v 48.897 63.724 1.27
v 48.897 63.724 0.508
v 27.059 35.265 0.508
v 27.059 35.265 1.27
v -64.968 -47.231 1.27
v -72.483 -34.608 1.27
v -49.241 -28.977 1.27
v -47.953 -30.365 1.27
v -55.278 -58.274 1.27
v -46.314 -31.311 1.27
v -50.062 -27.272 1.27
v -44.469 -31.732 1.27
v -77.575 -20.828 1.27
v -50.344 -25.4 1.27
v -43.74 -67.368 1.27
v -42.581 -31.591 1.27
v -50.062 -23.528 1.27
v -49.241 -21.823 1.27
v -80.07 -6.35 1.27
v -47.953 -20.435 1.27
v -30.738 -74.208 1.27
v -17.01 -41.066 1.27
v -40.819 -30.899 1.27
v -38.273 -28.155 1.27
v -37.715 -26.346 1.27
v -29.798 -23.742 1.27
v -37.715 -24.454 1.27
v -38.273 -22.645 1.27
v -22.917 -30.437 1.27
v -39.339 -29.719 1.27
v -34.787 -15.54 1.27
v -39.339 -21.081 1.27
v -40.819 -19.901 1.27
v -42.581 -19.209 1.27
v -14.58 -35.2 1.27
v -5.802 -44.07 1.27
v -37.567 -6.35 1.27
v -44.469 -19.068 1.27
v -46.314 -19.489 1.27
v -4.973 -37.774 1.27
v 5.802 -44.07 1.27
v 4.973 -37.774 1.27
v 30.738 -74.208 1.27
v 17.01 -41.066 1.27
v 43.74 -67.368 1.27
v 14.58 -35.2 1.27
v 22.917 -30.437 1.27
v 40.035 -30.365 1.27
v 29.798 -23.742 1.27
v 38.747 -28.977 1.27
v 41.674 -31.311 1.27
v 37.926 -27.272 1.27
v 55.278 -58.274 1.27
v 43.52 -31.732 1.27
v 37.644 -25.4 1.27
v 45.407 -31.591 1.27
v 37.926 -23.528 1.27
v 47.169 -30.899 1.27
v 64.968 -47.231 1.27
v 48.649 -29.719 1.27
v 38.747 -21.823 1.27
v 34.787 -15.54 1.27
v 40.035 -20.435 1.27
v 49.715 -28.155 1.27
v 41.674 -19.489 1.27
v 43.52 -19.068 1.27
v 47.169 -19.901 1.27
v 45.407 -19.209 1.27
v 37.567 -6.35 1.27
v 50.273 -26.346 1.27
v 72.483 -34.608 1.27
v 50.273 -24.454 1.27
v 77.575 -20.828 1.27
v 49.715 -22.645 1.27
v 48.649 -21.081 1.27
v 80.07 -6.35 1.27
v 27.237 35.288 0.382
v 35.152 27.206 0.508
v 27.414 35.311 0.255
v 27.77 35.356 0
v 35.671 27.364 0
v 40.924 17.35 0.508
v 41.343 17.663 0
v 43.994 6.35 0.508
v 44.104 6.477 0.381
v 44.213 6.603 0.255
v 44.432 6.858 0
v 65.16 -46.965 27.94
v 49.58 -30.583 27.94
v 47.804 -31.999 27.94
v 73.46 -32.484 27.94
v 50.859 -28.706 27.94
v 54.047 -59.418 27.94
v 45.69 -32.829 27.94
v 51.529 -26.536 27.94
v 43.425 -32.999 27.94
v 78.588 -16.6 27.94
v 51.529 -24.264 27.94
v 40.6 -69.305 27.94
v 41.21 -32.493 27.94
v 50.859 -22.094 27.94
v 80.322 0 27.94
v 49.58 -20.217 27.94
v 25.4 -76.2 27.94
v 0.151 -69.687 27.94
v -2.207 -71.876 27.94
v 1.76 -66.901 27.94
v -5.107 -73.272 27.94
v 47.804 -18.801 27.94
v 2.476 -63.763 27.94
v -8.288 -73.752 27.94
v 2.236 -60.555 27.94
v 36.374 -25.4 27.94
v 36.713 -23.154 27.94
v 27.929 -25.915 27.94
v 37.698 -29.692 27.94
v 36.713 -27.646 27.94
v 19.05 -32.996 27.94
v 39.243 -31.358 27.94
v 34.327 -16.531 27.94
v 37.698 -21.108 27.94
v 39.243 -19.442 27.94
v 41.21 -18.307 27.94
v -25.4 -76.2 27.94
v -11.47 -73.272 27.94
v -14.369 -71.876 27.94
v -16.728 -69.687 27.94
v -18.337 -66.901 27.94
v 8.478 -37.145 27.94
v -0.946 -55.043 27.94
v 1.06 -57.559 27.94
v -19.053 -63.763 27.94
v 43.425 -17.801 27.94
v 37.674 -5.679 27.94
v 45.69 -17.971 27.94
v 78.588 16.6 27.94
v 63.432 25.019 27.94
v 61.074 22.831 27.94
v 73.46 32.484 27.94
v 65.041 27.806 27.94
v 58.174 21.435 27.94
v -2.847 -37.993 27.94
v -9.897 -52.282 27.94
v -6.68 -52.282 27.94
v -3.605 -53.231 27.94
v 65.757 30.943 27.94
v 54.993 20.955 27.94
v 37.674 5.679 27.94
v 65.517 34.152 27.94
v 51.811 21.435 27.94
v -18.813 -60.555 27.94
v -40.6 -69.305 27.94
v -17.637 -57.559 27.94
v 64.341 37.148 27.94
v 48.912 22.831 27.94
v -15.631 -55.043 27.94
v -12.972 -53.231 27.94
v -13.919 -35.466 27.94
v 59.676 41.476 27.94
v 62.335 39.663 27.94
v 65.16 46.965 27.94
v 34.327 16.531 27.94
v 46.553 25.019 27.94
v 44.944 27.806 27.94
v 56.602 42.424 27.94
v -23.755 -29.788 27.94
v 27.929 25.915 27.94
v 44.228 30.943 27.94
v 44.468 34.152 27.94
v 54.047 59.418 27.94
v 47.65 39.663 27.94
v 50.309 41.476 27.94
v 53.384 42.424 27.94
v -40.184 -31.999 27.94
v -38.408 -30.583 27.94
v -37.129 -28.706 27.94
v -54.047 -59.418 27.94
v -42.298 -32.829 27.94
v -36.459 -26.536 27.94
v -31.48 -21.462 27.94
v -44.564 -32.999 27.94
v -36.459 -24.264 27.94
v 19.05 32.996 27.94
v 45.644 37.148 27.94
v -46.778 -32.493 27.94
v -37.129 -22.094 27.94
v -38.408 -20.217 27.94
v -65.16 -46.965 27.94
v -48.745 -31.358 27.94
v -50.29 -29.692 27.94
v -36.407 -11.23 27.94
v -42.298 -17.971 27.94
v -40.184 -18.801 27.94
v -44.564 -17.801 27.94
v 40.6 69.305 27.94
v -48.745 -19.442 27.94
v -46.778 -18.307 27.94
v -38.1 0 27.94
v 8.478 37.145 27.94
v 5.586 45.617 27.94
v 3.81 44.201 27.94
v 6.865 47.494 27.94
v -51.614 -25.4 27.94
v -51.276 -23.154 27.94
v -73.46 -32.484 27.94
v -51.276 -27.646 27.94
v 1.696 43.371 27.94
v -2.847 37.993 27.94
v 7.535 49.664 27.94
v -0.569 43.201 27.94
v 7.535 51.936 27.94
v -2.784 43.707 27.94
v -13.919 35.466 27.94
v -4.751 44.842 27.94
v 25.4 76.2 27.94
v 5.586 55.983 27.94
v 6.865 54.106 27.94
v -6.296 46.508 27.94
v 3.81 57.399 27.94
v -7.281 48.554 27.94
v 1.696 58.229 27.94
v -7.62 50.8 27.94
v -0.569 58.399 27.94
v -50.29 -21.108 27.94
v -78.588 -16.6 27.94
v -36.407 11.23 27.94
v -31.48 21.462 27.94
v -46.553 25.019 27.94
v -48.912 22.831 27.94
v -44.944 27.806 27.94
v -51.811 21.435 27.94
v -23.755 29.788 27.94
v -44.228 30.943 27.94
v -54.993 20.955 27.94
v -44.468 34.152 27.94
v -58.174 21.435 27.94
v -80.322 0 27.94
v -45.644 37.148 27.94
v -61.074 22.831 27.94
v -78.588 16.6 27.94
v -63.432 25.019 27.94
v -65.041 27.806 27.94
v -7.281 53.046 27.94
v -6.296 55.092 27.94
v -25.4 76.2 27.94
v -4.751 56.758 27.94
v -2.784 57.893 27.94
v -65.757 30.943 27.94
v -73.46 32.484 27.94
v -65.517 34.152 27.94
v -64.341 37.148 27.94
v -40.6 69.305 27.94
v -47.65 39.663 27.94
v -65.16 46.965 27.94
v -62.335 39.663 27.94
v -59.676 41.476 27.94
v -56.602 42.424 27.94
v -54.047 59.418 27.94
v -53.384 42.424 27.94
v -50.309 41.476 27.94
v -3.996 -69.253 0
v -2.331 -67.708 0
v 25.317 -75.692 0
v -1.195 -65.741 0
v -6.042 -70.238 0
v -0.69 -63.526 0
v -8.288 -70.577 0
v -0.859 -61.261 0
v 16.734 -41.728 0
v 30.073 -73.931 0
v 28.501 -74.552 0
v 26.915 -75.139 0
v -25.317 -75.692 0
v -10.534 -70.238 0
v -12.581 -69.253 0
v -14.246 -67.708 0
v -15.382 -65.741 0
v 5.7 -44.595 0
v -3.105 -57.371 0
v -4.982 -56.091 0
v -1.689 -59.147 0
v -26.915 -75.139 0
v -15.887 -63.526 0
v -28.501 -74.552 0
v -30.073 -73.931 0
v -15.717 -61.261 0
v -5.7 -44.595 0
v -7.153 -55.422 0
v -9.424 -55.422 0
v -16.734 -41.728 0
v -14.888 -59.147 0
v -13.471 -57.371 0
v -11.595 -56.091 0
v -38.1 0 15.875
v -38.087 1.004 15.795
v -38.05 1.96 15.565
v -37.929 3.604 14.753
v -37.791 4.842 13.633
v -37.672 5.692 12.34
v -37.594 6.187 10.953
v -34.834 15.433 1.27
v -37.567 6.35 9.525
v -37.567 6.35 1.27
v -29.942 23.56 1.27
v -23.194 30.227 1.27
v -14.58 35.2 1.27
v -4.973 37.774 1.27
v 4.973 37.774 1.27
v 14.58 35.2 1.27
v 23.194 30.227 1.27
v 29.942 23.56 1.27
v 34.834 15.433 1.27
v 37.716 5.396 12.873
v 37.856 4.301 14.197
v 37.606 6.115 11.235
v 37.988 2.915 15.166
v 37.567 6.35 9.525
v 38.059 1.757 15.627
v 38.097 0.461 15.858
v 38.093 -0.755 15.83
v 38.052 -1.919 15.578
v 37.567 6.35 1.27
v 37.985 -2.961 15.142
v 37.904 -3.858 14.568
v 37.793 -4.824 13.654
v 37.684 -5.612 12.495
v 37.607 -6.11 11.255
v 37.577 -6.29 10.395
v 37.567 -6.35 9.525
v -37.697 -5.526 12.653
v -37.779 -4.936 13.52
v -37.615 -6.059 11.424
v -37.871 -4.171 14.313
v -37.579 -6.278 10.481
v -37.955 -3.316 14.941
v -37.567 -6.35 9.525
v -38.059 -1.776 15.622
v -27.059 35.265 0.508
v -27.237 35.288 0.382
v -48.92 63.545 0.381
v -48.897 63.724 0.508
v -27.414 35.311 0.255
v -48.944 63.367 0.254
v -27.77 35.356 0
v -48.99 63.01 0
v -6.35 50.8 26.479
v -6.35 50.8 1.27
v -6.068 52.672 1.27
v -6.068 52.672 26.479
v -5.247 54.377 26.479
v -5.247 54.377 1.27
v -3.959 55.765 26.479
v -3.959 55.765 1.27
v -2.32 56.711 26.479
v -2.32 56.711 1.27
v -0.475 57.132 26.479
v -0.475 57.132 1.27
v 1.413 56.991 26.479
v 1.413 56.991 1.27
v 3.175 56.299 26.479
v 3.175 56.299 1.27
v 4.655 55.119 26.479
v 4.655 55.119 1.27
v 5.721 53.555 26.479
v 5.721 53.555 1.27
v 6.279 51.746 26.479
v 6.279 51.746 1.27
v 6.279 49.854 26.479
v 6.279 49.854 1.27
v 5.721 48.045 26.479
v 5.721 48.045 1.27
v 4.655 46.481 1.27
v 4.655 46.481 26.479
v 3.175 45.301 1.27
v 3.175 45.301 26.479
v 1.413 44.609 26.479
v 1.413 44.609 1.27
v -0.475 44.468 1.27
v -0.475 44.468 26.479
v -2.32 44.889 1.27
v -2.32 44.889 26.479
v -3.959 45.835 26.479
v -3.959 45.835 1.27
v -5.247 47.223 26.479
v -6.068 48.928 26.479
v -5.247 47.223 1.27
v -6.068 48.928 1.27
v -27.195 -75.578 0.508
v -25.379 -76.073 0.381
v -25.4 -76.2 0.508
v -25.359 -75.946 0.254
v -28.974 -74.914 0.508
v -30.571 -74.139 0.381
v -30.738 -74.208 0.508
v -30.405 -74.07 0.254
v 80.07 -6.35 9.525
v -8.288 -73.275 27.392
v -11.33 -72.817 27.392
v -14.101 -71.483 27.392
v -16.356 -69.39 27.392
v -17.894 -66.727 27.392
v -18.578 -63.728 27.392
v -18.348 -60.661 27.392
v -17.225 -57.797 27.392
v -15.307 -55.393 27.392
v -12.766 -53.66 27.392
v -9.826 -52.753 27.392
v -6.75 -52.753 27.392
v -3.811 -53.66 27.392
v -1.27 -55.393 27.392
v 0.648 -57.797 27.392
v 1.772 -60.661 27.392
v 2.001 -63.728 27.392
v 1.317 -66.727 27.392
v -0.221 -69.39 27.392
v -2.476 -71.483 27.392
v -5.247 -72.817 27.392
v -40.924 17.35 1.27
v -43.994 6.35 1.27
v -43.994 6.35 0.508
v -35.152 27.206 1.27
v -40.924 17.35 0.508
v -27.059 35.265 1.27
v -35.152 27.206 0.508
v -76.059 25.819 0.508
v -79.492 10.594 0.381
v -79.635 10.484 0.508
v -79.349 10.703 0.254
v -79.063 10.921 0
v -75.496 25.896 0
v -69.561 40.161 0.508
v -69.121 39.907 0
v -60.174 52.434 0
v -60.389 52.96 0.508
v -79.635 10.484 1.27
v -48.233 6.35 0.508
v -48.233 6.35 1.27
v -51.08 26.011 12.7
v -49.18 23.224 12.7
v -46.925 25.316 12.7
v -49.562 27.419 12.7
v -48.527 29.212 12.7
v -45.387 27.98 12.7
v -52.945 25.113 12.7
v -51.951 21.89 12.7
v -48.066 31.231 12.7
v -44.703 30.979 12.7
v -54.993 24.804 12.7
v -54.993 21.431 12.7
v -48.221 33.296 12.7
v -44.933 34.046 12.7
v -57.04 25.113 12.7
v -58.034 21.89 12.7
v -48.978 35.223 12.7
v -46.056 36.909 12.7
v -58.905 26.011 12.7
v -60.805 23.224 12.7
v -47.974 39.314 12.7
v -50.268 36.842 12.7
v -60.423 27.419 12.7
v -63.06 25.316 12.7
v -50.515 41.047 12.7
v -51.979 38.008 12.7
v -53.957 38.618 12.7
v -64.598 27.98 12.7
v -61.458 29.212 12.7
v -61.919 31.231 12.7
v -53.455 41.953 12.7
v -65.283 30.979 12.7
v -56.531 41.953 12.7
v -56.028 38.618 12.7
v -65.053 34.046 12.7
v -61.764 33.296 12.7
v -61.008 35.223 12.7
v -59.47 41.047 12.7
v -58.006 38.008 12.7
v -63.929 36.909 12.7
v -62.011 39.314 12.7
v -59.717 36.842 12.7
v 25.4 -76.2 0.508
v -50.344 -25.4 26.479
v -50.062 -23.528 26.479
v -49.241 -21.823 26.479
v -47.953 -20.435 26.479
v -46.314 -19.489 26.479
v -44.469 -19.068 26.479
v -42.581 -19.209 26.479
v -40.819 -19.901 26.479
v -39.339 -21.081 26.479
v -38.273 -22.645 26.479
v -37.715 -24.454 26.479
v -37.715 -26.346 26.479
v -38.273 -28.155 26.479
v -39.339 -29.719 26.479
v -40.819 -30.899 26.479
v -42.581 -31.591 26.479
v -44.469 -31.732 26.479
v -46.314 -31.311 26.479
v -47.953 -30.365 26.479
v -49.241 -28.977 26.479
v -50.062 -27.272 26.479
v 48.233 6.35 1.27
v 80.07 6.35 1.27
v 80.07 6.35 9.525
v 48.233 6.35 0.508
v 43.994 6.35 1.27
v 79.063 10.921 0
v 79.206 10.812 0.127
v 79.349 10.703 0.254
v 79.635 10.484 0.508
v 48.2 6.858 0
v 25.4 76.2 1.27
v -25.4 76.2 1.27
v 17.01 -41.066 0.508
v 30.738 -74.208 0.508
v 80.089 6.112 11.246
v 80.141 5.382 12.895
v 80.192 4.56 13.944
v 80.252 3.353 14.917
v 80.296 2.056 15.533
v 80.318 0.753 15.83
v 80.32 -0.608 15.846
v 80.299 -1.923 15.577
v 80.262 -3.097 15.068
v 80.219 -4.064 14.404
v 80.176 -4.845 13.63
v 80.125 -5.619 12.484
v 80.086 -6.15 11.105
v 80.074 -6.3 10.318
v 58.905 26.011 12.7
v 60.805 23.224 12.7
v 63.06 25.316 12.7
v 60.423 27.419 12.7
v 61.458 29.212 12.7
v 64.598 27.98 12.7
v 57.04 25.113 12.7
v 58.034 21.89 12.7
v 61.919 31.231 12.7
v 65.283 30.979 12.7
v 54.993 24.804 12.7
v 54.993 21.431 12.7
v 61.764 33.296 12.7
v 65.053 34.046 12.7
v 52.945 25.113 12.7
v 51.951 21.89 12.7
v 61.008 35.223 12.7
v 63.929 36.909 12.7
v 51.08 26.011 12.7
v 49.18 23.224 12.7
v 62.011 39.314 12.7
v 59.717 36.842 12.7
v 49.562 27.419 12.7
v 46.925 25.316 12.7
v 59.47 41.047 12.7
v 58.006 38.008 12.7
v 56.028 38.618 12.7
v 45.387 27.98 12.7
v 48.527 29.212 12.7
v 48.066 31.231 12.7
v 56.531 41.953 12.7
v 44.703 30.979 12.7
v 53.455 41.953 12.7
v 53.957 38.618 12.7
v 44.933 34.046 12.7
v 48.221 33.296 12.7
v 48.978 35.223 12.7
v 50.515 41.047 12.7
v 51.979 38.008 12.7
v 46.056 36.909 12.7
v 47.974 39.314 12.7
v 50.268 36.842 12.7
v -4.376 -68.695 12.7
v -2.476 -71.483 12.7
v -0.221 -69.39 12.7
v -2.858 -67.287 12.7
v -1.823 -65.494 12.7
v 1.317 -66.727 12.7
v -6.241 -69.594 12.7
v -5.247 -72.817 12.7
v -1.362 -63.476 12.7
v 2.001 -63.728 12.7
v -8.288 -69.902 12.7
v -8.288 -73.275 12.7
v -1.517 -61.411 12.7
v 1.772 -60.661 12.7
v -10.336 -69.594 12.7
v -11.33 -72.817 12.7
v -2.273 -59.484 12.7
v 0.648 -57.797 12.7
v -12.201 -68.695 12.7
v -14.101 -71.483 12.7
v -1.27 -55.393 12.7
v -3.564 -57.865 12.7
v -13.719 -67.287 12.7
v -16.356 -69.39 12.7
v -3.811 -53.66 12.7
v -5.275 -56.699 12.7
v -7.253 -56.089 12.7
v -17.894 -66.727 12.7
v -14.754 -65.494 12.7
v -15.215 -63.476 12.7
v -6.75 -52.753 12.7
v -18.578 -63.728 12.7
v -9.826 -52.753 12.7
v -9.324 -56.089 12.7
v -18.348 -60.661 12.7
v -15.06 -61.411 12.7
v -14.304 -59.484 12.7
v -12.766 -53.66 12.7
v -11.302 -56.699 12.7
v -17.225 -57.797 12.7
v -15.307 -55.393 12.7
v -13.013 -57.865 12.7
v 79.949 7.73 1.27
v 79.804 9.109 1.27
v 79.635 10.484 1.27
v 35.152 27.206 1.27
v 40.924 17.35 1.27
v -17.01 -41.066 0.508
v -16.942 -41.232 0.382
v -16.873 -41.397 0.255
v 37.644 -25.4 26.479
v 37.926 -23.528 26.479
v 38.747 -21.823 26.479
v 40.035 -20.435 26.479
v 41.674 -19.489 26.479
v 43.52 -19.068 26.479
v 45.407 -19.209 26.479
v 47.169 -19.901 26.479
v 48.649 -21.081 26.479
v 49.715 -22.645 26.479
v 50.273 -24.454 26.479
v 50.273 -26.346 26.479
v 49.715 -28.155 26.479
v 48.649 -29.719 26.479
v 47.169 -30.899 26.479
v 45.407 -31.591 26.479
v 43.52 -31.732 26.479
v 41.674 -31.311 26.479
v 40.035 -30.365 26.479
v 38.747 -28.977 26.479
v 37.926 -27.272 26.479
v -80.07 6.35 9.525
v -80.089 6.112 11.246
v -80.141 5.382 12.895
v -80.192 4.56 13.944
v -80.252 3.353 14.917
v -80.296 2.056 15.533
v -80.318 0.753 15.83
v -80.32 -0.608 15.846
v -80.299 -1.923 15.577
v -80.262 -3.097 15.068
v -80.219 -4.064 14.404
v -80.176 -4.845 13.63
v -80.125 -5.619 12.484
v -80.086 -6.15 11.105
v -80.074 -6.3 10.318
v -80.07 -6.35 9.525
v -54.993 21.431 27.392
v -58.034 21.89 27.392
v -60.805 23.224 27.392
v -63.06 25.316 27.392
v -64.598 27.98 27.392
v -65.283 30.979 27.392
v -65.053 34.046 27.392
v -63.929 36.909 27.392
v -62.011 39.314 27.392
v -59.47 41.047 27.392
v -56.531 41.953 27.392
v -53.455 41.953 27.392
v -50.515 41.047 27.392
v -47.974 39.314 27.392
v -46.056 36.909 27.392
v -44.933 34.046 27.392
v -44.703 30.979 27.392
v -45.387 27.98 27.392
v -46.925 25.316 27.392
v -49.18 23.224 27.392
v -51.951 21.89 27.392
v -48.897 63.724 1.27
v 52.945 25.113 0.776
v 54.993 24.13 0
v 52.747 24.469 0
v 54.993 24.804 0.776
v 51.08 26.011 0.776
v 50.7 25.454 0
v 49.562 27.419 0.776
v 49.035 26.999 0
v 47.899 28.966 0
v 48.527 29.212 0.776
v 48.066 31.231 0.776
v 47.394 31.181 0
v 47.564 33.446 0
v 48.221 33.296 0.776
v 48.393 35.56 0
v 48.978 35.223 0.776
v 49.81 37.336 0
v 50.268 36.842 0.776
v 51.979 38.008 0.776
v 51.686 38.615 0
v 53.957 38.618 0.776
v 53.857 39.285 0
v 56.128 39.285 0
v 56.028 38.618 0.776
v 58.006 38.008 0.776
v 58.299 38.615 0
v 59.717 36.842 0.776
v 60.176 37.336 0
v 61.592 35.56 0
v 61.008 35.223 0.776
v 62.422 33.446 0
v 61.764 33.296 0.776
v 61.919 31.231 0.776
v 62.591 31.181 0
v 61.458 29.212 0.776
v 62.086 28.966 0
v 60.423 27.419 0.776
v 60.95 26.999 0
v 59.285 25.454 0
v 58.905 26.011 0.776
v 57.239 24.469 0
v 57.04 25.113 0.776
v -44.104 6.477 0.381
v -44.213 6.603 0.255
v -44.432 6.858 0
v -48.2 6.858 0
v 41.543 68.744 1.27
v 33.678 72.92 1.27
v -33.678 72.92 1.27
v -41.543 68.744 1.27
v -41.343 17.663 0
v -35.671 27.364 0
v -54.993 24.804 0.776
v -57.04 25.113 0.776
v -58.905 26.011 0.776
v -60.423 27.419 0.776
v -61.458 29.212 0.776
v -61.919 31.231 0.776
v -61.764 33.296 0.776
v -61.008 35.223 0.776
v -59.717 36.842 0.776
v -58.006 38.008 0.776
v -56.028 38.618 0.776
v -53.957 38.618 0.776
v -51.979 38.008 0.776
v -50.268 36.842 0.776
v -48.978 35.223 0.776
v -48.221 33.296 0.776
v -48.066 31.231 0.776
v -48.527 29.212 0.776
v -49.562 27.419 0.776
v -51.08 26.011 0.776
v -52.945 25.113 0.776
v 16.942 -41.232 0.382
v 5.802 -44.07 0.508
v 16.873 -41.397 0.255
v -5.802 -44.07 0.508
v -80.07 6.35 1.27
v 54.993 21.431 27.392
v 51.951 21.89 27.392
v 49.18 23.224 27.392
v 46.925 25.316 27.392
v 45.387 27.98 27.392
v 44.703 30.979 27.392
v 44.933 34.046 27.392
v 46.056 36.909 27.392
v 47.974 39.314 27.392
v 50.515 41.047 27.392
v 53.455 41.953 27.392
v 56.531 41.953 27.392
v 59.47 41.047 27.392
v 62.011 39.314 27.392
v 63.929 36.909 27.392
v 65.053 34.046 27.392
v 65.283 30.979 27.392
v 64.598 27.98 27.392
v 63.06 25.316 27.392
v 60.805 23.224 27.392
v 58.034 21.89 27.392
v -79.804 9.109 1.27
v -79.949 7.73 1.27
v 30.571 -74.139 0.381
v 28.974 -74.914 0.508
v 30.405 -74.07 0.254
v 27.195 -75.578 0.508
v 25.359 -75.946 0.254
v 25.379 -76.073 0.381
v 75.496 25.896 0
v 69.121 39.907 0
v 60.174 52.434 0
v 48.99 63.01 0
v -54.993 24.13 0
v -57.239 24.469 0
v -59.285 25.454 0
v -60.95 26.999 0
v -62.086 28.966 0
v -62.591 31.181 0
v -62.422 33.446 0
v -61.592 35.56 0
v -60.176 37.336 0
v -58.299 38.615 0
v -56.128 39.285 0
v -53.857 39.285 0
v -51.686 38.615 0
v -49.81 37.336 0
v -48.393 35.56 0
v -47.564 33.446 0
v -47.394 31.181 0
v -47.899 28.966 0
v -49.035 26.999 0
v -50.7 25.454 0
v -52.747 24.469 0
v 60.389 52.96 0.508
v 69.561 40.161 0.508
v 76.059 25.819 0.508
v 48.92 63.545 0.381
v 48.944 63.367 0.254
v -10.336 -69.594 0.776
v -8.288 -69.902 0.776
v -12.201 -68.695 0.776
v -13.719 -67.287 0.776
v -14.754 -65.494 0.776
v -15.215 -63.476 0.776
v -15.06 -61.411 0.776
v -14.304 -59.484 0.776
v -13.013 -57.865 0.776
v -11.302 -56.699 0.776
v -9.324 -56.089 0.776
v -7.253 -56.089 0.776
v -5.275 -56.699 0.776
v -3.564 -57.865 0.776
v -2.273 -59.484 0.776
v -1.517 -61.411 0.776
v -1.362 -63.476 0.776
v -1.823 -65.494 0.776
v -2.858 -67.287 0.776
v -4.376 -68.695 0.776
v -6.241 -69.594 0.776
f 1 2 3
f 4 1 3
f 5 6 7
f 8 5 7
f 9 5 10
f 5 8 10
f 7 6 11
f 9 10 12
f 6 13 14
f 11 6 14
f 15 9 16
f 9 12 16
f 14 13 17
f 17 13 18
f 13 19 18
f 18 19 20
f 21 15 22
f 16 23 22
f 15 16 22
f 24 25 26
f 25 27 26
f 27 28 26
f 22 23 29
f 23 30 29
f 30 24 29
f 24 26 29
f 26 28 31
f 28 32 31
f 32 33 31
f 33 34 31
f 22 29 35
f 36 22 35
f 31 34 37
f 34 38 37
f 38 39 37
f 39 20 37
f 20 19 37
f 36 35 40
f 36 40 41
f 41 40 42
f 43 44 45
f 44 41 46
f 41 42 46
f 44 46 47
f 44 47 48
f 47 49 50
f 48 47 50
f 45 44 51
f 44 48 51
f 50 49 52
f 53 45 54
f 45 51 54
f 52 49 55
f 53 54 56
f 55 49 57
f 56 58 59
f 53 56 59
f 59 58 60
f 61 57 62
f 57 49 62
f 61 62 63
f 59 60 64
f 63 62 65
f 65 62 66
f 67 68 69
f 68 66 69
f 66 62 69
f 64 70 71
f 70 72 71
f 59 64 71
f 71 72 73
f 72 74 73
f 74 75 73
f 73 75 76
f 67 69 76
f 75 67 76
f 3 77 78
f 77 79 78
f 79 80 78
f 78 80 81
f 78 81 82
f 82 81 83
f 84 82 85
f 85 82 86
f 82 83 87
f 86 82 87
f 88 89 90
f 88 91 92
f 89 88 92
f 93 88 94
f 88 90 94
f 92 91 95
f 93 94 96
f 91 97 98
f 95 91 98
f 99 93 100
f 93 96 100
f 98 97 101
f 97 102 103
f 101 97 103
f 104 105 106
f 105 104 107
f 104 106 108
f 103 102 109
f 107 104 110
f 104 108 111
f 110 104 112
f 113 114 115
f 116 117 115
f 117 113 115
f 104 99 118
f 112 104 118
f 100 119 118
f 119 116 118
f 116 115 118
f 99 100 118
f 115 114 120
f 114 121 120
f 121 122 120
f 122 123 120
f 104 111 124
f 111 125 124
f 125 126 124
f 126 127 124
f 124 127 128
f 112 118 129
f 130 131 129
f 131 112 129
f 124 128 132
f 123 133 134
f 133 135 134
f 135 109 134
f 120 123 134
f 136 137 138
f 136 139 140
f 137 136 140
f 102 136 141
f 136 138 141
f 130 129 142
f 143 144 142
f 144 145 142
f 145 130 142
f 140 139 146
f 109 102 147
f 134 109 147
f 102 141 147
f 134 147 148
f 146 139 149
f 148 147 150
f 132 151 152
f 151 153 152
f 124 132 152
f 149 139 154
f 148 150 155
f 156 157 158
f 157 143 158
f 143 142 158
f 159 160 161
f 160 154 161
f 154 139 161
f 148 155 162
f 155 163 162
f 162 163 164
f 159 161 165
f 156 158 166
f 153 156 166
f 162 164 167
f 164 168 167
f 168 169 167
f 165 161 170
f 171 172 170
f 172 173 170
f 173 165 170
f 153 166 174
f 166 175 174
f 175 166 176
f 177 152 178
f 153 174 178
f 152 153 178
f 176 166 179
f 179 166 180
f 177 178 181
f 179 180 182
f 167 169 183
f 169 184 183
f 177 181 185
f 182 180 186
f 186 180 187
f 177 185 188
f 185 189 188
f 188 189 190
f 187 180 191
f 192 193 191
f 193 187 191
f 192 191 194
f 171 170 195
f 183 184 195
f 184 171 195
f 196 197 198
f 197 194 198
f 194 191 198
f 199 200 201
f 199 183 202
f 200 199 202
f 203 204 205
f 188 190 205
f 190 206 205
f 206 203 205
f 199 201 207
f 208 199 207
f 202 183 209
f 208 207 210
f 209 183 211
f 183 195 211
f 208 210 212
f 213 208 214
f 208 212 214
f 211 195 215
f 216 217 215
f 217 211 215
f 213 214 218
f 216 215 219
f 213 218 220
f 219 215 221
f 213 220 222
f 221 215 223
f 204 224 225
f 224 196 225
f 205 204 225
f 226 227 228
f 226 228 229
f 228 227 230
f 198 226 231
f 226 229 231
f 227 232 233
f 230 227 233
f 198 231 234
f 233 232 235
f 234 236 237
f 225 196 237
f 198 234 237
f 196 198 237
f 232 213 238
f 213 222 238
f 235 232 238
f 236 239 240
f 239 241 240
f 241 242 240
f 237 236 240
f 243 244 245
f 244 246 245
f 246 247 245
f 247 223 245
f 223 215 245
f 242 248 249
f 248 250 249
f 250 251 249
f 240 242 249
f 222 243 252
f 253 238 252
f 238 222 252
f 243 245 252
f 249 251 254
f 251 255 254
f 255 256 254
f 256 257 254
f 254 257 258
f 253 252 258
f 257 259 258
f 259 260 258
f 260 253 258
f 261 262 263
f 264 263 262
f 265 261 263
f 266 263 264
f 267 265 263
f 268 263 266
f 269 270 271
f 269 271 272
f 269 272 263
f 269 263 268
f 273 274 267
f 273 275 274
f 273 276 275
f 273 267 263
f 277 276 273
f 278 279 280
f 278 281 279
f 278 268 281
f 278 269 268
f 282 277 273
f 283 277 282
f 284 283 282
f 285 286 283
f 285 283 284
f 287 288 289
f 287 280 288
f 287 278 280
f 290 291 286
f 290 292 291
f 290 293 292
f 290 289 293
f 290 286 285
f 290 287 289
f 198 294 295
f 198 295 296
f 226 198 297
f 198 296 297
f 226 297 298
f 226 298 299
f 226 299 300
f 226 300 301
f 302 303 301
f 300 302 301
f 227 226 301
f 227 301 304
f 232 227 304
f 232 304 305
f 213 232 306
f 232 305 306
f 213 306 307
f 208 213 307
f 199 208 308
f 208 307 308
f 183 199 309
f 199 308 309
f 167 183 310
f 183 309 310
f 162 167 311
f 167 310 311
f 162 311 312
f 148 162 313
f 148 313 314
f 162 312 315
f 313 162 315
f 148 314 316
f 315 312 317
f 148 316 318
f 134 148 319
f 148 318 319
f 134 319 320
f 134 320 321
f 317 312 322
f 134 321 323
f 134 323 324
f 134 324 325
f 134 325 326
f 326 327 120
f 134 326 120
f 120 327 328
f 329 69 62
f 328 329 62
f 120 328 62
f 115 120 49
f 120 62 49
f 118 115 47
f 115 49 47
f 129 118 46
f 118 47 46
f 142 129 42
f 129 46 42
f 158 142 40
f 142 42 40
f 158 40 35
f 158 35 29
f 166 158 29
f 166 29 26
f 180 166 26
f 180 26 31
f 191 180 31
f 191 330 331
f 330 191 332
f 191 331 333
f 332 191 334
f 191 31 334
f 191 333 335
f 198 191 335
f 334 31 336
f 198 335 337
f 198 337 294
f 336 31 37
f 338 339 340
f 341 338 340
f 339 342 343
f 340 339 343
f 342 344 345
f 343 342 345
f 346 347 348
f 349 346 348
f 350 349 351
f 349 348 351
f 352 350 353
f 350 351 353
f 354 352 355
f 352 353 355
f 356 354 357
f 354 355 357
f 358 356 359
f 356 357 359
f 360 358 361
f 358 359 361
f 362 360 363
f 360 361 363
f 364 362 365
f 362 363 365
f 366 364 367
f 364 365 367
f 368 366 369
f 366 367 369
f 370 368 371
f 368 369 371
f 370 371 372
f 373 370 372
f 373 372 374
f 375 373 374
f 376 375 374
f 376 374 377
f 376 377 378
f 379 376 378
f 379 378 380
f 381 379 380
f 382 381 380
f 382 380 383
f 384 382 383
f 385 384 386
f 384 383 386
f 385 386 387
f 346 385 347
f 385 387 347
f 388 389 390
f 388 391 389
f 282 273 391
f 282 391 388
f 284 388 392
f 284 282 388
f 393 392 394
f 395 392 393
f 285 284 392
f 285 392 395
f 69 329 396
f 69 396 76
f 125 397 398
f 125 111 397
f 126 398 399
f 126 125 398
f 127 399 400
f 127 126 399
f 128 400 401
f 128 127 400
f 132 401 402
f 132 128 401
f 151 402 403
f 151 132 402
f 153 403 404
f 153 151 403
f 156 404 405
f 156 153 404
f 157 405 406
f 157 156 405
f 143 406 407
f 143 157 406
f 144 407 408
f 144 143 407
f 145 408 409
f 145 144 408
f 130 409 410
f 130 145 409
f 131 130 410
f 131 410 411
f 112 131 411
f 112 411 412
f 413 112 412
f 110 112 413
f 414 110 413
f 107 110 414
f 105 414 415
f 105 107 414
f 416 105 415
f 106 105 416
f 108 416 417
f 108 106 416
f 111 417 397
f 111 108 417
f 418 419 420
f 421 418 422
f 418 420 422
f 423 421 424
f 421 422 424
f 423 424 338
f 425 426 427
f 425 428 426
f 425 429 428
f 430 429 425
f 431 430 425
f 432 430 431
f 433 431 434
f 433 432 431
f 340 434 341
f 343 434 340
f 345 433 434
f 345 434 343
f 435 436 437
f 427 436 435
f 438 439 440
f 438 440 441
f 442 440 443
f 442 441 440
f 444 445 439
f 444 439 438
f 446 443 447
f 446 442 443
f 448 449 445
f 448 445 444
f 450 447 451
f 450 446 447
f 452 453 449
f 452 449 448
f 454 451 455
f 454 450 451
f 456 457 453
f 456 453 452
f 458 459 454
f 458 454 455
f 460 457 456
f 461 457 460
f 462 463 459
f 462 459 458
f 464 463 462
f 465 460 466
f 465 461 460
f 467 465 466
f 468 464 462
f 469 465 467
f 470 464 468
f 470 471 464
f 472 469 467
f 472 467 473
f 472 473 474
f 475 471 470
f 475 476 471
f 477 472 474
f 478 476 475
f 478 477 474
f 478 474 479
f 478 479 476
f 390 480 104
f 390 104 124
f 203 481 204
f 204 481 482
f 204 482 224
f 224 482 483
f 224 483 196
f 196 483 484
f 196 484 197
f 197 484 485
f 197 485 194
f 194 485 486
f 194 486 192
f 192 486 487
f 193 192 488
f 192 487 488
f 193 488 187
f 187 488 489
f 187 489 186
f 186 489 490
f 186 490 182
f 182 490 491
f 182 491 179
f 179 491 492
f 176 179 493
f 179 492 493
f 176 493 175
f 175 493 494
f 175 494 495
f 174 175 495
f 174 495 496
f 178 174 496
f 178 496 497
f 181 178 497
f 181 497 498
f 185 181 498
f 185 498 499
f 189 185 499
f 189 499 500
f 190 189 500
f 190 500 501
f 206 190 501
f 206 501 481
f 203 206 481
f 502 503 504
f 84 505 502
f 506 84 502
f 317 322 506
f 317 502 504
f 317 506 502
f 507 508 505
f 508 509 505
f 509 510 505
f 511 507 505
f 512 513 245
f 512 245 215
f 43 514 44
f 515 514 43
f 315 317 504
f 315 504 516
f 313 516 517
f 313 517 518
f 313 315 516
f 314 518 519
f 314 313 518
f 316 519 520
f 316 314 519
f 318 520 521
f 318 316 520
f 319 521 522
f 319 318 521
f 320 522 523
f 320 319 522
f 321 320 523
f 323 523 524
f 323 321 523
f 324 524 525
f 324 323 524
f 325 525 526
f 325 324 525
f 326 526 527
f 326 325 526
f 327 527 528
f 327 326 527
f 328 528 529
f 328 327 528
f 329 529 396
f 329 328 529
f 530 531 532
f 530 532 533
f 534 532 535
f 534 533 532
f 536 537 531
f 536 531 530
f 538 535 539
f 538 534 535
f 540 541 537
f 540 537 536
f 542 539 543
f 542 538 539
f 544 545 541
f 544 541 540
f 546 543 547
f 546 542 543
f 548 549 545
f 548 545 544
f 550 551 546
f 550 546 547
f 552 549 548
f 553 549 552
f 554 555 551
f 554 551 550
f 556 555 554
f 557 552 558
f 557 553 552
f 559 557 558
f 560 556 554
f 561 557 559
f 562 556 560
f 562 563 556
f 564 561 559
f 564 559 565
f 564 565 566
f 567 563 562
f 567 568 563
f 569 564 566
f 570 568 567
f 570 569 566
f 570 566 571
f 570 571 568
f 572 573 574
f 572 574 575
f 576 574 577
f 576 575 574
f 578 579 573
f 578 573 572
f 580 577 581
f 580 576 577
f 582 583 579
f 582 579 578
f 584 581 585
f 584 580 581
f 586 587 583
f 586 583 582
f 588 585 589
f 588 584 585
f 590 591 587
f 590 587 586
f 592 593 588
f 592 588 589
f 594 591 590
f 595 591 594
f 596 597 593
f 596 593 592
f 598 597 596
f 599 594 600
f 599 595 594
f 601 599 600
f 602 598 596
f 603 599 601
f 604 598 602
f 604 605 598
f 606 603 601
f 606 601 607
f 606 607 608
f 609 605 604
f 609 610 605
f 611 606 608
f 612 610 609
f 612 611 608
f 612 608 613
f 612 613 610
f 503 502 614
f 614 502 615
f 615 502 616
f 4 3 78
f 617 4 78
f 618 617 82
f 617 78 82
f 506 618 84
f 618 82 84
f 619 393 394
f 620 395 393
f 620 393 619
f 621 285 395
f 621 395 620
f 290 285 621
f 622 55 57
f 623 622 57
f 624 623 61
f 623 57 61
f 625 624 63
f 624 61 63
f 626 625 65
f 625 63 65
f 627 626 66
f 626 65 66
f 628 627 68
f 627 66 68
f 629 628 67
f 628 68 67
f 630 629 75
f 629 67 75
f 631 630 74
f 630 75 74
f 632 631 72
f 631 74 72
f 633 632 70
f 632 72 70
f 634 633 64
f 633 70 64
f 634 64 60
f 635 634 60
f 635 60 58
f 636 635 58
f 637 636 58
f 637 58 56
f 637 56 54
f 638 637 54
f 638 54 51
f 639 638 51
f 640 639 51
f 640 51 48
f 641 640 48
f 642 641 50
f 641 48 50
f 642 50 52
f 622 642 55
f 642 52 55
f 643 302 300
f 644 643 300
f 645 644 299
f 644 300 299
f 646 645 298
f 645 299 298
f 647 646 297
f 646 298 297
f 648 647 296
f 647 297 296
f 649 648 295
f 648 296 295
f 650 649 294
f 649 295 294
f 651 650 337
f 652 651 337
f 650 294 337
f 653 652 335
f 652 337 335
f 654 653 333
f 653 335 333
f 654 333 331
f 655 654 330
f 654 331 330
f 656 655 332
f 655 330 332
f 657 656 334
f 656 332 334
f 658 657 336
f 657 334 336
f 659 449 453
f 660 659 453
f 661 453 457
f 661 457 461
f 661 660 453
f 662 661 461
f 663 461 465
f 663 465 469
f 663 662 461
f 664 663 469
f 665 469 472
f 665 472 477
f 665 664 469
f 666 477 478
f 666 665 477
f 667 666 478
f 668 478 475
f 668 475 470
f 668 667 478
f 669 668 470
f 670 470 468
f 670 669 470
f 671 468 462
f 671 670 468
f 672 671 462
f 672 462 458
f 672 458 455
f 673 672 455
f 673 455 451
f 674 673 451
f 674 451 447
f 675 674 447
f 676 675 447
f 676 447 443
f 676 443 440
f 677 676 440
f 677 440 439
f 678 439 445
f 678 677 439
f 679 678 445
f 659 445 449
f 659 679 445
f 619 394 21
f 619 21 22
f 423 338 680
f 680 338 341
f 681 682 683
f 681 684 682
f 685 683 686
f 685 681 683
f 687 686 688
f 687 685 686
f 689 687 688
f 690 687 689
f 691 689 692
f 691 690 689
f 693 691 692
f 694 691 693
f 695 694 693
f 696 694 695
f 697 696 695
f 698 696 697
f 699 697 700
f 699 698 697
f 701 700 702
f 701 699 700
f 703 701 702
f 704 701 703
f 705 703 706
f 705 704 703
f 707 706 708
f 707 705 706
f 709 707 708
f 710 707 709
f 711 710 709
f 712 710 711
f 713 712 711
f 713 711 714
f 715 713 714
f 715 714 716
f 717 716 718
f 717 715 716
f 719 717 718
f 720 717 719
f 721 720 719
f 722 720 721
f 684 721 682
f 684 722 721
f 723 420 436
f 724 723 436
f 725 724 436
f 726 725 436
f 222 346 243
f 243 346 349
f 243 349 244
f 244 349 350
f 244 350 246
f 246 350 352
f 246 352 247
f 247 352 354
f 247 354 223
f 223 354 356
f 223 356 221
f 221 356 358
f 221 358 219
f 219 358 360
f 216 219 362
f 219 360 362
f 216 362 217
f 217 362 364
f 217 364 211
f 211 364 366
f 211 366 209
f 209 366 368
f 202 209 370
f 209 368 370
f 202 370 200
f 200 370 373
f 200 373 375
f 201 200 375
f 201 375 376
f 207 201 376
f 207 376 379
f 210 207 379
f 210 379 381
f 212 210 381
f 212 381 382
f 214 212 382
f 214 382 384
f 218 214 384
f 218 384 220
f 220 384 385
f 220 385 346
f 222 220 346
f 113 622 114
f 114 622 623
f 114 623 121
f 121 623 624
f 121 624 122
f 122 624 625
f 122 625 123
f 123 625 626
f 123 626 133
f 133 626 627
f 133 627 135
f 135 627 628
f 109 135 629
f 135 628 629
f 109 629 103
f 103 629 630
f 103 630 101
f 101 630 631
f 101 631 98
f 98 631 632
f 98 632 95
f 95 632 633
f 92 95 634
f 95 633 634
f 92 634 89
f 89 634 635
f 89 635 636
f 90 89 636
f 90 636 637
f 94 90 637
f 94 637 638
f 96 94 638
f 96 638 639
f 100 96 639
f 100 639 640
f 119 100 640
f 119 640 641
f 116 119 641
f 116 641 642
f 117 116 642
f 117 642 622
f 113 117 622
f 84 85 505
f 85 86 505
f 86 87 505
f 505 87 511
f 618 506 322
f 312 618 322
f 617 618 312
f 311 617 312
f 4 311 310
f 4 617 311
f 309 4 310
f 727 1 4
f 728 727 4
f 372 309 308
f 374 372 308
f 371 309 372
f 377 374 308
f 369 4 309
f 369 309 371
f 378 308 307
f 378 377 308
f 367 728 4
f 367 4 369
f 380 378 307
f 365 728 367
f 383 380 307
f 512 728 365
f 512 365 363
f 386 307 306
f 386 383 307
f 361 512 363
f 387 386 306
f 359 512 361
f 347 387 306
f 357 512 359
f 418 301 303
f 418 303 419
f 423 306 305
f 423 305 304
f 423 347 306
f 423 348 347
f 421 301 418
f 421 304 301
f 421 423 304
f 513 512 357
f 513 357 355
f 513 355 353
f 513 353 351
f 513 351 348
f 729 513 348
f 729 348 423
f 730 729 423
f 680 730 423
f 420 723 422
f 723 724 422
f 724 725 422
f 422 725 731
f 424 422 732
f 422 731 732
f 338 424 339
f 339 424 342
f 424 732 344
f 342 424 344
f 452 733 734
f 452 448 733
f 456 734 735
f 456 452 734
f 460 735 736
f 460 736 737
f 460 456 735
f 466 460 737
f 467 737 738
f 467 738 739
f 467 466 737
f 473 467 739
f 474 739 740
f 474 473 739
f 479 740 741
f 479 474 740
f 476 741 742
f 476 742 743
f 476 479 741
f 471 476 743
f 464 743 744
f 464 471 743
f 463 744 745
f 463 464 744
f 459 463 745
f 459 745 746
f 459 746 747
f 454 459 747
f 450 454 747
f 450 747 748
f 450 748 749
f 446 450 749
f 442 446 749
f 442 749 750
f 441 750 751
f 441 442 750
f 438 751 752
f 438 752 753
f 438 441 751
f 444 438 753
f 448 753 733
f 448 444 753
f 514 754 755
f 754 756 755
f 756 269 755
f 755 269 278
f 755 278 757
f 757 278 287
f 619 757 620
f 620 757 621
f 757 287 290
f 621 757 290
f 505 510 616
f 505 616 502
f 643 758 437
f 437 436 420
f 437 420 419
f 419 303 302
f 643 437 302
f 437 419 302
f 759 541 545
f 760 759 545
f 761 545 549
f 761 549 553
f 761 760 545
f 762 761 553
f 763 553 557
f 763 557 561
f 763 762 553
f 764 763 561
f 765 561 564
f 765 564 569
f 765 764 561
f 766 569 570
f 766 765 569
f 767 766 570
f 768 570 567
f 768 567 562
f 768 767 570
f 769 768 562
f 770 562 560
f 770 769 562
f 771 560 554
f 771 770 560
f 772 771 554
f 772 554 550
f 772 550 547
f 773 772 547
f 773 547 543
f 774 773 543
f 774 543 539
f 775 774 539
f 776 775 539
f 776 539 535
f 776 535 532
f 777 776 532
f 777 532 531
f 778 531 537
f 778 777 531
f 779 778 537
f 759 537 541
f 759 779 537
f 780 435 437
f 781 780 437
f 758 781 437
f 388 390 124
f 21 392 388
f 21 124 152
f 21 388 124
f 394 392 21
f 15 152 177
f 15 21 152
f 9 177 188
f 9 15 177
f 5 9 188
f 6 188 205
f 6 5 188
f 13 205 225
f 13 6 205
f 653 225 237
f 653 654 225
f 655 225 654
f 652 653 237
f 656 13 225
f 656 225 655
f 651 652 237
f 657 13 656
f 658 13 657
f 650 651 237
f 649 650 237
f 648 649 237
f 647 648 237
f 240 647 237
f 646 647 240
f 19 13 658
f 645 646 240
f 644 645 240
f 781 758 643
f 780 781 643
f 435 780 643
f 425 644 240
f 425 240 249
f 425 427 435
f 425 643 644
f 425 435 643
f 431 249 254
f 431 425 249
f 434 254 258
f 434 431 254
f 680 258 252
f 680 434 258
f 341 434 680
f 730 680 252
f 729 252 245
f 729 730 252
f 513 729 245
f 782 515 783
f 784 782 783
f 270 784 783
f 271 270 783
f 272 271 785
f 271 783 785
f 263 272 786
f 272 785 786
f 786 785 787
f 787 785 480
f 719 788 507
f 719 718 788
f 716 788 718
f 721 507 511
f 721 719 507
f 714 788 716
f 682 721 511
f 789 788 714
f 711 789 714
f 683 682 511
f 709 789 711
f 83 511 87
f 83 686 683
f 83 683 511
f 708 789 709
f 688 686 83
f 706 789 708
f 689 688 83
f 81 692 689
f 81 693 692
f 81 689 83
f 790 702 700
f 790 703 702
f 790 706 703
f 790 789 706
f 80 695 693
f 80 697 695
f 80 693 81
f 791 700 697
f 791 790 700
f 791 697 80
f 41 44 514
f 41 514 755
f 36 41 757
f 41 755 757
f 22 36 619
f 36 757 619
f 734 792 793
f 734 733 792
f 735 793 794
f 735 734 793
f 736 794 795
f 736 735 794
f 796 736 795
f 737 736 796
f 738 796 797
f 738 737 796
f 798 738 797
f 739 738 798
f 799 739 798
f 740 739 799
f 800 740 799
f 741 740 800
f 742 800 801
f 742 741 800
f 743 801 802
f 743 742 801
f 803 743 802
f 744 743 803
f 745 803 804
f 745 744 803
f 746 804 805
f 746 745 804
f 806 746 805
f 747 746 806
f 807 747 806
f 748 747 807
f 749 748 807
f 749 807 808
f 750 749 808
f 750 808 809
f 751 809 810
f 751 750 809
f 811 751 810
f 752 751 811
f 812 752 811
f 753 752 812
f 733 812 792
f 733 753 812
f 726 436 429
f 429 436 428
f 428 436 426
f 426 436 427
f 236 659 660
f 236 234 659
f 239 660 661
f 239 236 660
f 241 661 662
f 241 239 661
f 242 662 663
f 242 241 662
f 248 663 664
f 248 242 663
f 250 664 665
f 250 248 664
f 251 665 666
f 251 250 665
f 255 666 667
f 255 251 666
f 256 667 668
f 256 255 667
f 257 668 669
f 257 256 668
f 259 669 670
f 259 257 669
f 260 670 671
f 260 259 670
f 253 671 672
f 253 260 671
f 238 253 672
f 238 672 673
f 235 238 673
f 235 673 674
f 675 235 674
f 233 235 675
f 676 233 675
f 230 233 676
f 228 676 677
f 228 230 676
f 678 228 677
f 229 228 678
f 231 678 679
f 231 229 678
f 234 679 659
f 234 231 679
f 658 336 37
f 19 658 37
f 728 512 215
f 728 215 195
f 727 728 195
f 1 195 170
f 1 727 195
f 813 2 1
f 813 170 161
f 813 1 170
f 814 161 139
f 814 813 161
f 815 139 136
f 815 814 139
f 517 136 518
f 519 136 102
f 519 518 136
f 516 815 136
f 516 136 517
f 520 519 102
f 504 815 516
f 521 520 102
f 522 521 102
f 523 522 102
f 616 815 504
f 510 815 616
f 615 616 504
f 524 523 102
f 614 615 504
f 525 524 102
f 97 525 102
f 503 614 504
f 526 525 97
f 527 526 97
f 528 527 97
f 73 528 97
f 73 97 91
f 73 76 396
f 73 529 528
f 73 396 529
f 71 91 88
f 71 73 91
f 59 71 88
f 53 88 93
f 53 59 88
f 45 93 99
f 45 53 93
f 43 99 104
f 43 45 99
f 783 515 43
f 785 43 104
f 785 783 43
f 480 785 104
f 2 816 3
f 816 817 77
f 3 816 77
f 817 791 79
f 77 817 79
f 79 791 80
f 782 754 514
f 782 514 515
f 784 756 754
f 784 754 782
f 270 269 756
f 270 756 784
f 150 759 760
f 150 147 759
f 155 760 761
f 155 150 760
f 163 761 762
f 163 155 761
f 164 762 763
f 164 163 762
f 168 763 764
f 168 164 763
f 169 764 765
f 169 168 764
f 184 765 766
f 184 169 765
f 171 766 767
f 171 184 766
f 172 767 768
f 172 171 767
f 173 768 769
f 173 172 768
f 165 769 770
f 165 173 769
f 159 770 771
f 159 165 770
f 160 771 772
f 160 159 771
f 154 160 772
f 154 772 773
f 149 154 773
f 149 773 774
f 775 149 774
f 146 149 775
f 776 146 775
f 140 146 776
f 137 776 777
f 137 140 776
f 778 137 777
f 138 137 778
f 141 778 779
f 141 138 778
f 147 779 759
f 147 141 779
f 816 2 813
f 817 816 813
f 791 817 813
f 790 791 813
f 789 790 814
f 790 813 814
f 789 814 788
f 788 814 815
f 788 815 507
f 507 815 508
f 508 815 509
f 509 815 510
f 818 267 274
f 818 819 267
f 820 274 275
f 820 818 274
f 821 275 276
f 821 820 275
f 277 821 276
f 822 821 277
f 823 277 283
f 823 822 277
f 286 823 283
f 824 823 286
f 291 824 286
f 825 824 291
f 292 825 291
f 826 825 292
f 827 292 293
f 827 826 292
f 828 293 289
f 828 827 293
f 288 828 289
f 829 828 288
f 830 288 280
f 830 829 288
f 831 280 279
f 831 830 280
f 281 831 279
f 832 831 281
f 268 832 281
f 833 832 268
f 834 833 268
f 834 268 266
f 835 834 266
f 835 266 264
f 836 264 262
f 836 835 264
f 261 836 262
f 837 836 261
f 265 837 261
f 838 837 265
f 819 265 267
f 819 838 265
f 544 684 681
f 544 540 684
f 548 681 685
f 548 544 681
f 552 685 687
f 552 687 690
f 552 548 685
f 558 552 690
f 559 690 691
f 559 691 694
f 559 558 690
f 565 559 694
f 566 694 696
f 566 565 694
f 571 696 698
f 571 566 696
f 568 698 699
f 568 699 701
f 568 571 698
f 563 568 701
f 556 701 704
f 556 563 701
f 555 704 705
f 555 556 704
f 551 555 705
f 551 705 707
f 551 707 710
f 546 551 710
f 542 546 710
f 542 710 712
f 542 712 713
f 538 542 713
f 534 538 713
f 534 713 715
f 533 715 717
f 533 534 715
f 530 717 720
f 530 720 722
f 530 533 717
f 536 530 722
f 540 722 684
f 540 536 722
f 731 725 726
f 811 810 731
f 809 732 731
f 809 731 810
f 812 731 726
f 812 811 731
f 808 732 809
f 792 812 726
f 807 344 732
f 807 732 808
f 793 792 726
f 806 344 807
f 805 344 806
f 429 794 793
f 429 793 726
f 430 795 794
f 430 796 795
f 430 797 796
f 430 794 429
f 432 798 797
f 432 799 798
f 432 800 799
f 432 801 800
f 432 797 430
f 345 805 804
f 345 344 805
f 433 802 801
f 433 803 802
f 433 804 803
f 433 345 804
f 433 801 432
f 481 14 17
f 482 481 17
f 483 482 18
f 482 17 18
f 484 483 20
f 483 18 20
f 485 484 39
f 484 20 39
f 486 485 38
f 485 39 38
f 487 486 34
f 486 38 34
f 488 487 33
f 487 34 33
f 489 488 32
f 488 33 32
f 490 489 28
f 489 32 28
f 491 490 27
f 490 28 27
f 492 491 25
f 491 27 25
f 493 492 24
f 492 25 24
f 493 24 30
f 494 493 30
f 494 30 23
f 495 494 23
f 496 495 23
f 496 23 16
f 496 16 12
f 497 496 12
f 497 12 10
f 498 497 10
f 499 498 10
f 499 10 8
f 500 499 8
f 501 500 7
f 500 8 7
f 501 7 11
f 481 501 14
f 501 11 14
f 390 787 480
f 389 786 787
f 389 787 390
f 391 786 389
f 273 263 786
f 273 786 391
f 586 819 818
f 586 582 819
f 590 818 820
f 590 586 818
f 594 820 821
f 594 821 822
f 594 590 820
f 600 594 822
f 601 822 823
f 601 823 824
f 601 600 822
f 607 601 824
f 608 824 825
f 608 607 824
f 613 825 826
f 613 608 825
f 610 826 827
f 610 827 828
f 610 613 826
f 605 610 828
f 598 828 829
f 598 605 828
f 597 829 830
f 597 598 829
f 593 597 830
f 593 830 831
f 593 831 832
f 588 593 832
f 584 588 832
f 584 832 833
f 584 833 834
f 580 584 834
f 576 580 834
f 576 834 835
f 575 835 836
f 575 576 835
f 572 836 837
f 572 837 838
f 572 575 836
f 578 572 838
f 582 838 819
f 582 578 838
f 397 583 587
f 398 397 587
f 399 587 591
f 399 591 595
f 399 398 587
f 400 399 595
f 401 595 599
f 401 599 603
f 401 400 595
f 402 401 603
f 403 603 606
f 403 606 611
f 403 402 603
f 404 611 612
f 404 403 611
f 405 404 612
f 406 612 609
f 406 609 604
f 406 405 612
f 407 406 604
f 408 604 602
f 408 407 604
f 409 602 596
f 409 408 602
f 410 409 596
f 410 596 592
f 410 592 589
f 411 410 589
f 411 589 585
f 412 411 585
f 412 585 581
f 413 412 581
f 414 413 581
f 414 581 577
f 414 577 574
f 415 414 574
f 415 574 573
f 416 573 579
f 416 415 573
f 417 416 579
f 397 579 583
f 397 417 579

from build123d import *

# Parameters (mm, degrees)
EXTRUDE1_DEPTH                                = 27.94
CBORE_FOR_1_2_SOCKET_HEAD_CAP_SCREW1_AT_COUNT = 2
CBORE_FOR_1_2_SOCKET_HEAD_CAP_SCREW1_AT_PITCH = 109.985226281
CBORE_FOR_1_2_SOCKET_HEAD_CAP_SCREW1_2_COUNT  = 2
CBORE_FOR_1_2_SOCKET_HEAD_CAP_SCREW1_2_PITCH  = 105.596640762
SKETCH6_R                                     = 38.1
CUT_EXTRUDE1_DEPTH                            = 28.94
CUT_EXTRUDE3_DEPTH                            = 81.321852568
CUT_EXTRUDE3_DEPTH_BACK                       = 81.321852568
CUT_EXTRUDE2_DEPTH                            = 1.27
F_1_2_20_TAPPED_HOLE1_D                       = 12.7
F_1_2_20_TAPPED_HOLE1_CSINK_D                 = 15.24
F_1_2_20_TAPPED_HOLE1_CSINK_ANGLE             = 82
SKETCH11_R                                    = 44.45
CUT_EXTRUDE4_DEPTH                            = 1.27
CHAMFER1_SIZE                                 = 0.508


with BuildPart() as part:
    # Sketch1 → Extrude1 (new body)
    with BuildSketch(Plane.XY):
        with BuildLine():
            Line((-25.4, 76.2), (25.4, 76.2))
            ThreePointArc((25.4, 76.2), (80.321852568, 0), (25.4, -76.2))
            Line((25.4, -76.2), (-25.4, -76.2))
            ThreePointArc((-25.4, -76.2), (-80.321852568, 0), (-25.4, 76.2))
        make_face()
    extrude(amount=EXTRUDE1_DEPTH)

    # Sketch3 → CBORE for 1_2 Socket Head Cap Screw1 (revolve, cut)
    with BuildSketch(Plane(origin=(-54.99261314, 31.75, 27.94), x_dir=(0, -1, 0), z_dir=(1, 0, 0))):
        Polygon((0, 0), (0, 27.94), (7.62, 27.94), (6.94563, 27.164226057), (6.94563, 15.24), (10.31875, 15.24), (10.31875, 0.547862954), (10.795, 0), align=None)
    cbore_for_1_2_socket_head_cap_screw1 = revolve(axis=Axis((-54.99261314, 31.75, 34.29), (0, 0, -1)), mode=Mode.SUBTRACT)

    # CBORE for 1_2 Socket Head Cap Screw1 at: CBORE for 1_2 Socket Head Cap Screw1 ×2
    with Locations(*[(i * CBORE_FOR_1_2_SOCKET_HEAD_CAP_SCREW1_AT_PITCH, 0, 0) for i in range(1, CBORE_FOR_1_2_SOCKET_HEAD_CAP_SCREW1_AT_COUNT)]):
        add(cbore_for_1_2_socket_head_cap_screw1, mode=Mode.SUBTRACT)

    # CBORE for 1_2 Socket Head Cap Screw1 2: CBORE for 1_2 Socket Head Cap Screw1 ×2
    with Locations(*[Vector(0.44228869, -0.896872742, 0) * (i * CBORE_FOR_1_2_SOCKET_HEAD_CAP_SCREW1_2_PITCH) for i in range(1, CBORE_FOR_1_2_SOCKET_HEAD_CAP_SCREW1_2_COUNT)]):
        add(cbore_for_1_2_socket_head_cap_screw1, mode=Mode.SUBTRACT)

    # Sketch6 → Cut-Extrude1 (cut, through all)
    with BuildSketch(Plane(origin=(0, 0, 0), x_dir=(-1, 0, 0), z_dir=(0, 0, -1))):
        Circle(SKETCH6_R)
    extrude(amount=-CUT_EXTRUDE1_DEPTH, mode=Mode.SUBTRACT)

    # Sketch10 → Cut-Extrude3 (cut, two sides)
    with BuildSketch(Plane(origin=(0, 0, 0), x_dir=(0, 0, -1), z_dir=(1, 0, 0))) as cut_extrude3_sk:
        with BuildLine():
            Line((0, 6.35), (-9.525, 6.35))
            ThreePointArc((-9.525, 6.35), (-15.875, 0), (-9.525, -6.35))
            Line((-9.525, -6.35), (0, -6.35))
            Line((0, -6.35), (0, 6.35))
        make_face()
    extrude(amount=CUT_EXTRUDE3_DEPTH, mode=Mode.SUBTRACT)
    extrude(cut_extrude3_sk.sketch, amount=-CUT_EXTRUDE3_DEPTH_BACK, mode=Mode.SUBTRACT)

    # Sketch9 → Cut-Extrude2 (cut)
    with BuildSketch(Plane(origin=(0, 0, 0), x_dir=(-1, 0, 0), z_dir=(0, 0, -1))):
        with BuildLine():
            Line((-79.634687985, 10.484105568), (-37.774049218, 4.973047924))
            ThreePointArc((-37.774049218, 4.973047924), (-32.995567884, -19.05), (-14.580238773, -35.199810189))
            Line((-14.580238773, -35.199810189), (-30.737842235, -74.207715601))
            ThreePointArc((-30.737842235, -74.207715601), (-69.560764803, -40.160926284), (-79.634687985, 10.484105568))
        make_face()
        with BuildLine():
            Line((-48.89684575, 63.723610033), (-23.193810445, 30.226762265))
            ThreePointArc((-23.193810445, 30.226762265), (0, 38.1), (23.193810445, 30.226762265))
            Line((23.193810445, 30.226762265), (48.89684575, 63.723610033))
            ThreePointArc((48.89684575, 63.723610033), (0, 80.321852568), (-48.89684575, 63.723610033))
        make_face()
        with BuildLine():
            Line((37.774049218, 4.973047924), (79.634687985, 10.484105568))
            ThreePointArc((79.634687985, 10.484105568), (69.560764803, -40.160926284), (30.737842235, -74.207715601))
            Line((30.737842235, -74.207715601), (14.580238773, -35.199810189))
            ThreePointArc((14.580238773, -35.199810189), (32.995567884, -19.05), (37.774049218, 4.973047924))
        make_face()
    extrude(amount=-CUT_EXTRUDE2_DEPTH, mode=Mode.SUBTRACT)

    # 1_2-20 Tapped Hole1 (through all)
    with Locations(Plane.XY.offset(27.94)):
        with Locations((0, 50.8), (-43.994090512, -25.4), (43.994090512, -25.4)):
            CounterSinkHole(F_1_2_20_TAPPED_HOLE1_D / 2, F_1_2_20_TAPPED_HOLE1_CSINK_D / 2, counter_sink_angle=F_1_2_20_TAPPED_HOLE1_CSINK_ANGLE)

    # Sketch11 → Cut-Extrude4 (cut)
    with BuildSketch(Plane(origin=(0, 0, 0), x_dir=(-1, 0, 0), z_dir=(0, 0, -1))):
        Circle(SKETCH11_R)
    extrude(amount=-CUT_EXTRUDE4_DEPTH, mode=Mode.SUBTRACT)

    # Chamfer1
    chamfer1_edges = [part.edges().sort_by_distance(p)[0] for p in [
        (-28.086591676, -75.251201771, 0),
        (-69.560764803, 40.160926284, 0),
        (0, -76.2, 0),
        (-37.978145635, 49.494083005, 0),
        (-38.355757488, 22.464157396, 0),
        (-46.113564564, 6.35, 0),
        (-63.9338633, 8.417052784, 0),
        (46.113564564, 6.35, 0),
        (38.355757488, 22.464157396, 0),
        (37.978145635, 49.494083005, 0),
        (63.9338633, 8.417052784, 0),
        (69.560764803, 40.160926284, 0),
        (0, -44.45, 0),
        (23.874060402, -57.637080411, 0),
        (-23.874060402, -57.637080411, 0),
        (28.086591676, -75.251201771, 0),
    ]]
    chamfer(chamfer1_edges, length=CHAMFER1_SIZE)


solid = part.part
